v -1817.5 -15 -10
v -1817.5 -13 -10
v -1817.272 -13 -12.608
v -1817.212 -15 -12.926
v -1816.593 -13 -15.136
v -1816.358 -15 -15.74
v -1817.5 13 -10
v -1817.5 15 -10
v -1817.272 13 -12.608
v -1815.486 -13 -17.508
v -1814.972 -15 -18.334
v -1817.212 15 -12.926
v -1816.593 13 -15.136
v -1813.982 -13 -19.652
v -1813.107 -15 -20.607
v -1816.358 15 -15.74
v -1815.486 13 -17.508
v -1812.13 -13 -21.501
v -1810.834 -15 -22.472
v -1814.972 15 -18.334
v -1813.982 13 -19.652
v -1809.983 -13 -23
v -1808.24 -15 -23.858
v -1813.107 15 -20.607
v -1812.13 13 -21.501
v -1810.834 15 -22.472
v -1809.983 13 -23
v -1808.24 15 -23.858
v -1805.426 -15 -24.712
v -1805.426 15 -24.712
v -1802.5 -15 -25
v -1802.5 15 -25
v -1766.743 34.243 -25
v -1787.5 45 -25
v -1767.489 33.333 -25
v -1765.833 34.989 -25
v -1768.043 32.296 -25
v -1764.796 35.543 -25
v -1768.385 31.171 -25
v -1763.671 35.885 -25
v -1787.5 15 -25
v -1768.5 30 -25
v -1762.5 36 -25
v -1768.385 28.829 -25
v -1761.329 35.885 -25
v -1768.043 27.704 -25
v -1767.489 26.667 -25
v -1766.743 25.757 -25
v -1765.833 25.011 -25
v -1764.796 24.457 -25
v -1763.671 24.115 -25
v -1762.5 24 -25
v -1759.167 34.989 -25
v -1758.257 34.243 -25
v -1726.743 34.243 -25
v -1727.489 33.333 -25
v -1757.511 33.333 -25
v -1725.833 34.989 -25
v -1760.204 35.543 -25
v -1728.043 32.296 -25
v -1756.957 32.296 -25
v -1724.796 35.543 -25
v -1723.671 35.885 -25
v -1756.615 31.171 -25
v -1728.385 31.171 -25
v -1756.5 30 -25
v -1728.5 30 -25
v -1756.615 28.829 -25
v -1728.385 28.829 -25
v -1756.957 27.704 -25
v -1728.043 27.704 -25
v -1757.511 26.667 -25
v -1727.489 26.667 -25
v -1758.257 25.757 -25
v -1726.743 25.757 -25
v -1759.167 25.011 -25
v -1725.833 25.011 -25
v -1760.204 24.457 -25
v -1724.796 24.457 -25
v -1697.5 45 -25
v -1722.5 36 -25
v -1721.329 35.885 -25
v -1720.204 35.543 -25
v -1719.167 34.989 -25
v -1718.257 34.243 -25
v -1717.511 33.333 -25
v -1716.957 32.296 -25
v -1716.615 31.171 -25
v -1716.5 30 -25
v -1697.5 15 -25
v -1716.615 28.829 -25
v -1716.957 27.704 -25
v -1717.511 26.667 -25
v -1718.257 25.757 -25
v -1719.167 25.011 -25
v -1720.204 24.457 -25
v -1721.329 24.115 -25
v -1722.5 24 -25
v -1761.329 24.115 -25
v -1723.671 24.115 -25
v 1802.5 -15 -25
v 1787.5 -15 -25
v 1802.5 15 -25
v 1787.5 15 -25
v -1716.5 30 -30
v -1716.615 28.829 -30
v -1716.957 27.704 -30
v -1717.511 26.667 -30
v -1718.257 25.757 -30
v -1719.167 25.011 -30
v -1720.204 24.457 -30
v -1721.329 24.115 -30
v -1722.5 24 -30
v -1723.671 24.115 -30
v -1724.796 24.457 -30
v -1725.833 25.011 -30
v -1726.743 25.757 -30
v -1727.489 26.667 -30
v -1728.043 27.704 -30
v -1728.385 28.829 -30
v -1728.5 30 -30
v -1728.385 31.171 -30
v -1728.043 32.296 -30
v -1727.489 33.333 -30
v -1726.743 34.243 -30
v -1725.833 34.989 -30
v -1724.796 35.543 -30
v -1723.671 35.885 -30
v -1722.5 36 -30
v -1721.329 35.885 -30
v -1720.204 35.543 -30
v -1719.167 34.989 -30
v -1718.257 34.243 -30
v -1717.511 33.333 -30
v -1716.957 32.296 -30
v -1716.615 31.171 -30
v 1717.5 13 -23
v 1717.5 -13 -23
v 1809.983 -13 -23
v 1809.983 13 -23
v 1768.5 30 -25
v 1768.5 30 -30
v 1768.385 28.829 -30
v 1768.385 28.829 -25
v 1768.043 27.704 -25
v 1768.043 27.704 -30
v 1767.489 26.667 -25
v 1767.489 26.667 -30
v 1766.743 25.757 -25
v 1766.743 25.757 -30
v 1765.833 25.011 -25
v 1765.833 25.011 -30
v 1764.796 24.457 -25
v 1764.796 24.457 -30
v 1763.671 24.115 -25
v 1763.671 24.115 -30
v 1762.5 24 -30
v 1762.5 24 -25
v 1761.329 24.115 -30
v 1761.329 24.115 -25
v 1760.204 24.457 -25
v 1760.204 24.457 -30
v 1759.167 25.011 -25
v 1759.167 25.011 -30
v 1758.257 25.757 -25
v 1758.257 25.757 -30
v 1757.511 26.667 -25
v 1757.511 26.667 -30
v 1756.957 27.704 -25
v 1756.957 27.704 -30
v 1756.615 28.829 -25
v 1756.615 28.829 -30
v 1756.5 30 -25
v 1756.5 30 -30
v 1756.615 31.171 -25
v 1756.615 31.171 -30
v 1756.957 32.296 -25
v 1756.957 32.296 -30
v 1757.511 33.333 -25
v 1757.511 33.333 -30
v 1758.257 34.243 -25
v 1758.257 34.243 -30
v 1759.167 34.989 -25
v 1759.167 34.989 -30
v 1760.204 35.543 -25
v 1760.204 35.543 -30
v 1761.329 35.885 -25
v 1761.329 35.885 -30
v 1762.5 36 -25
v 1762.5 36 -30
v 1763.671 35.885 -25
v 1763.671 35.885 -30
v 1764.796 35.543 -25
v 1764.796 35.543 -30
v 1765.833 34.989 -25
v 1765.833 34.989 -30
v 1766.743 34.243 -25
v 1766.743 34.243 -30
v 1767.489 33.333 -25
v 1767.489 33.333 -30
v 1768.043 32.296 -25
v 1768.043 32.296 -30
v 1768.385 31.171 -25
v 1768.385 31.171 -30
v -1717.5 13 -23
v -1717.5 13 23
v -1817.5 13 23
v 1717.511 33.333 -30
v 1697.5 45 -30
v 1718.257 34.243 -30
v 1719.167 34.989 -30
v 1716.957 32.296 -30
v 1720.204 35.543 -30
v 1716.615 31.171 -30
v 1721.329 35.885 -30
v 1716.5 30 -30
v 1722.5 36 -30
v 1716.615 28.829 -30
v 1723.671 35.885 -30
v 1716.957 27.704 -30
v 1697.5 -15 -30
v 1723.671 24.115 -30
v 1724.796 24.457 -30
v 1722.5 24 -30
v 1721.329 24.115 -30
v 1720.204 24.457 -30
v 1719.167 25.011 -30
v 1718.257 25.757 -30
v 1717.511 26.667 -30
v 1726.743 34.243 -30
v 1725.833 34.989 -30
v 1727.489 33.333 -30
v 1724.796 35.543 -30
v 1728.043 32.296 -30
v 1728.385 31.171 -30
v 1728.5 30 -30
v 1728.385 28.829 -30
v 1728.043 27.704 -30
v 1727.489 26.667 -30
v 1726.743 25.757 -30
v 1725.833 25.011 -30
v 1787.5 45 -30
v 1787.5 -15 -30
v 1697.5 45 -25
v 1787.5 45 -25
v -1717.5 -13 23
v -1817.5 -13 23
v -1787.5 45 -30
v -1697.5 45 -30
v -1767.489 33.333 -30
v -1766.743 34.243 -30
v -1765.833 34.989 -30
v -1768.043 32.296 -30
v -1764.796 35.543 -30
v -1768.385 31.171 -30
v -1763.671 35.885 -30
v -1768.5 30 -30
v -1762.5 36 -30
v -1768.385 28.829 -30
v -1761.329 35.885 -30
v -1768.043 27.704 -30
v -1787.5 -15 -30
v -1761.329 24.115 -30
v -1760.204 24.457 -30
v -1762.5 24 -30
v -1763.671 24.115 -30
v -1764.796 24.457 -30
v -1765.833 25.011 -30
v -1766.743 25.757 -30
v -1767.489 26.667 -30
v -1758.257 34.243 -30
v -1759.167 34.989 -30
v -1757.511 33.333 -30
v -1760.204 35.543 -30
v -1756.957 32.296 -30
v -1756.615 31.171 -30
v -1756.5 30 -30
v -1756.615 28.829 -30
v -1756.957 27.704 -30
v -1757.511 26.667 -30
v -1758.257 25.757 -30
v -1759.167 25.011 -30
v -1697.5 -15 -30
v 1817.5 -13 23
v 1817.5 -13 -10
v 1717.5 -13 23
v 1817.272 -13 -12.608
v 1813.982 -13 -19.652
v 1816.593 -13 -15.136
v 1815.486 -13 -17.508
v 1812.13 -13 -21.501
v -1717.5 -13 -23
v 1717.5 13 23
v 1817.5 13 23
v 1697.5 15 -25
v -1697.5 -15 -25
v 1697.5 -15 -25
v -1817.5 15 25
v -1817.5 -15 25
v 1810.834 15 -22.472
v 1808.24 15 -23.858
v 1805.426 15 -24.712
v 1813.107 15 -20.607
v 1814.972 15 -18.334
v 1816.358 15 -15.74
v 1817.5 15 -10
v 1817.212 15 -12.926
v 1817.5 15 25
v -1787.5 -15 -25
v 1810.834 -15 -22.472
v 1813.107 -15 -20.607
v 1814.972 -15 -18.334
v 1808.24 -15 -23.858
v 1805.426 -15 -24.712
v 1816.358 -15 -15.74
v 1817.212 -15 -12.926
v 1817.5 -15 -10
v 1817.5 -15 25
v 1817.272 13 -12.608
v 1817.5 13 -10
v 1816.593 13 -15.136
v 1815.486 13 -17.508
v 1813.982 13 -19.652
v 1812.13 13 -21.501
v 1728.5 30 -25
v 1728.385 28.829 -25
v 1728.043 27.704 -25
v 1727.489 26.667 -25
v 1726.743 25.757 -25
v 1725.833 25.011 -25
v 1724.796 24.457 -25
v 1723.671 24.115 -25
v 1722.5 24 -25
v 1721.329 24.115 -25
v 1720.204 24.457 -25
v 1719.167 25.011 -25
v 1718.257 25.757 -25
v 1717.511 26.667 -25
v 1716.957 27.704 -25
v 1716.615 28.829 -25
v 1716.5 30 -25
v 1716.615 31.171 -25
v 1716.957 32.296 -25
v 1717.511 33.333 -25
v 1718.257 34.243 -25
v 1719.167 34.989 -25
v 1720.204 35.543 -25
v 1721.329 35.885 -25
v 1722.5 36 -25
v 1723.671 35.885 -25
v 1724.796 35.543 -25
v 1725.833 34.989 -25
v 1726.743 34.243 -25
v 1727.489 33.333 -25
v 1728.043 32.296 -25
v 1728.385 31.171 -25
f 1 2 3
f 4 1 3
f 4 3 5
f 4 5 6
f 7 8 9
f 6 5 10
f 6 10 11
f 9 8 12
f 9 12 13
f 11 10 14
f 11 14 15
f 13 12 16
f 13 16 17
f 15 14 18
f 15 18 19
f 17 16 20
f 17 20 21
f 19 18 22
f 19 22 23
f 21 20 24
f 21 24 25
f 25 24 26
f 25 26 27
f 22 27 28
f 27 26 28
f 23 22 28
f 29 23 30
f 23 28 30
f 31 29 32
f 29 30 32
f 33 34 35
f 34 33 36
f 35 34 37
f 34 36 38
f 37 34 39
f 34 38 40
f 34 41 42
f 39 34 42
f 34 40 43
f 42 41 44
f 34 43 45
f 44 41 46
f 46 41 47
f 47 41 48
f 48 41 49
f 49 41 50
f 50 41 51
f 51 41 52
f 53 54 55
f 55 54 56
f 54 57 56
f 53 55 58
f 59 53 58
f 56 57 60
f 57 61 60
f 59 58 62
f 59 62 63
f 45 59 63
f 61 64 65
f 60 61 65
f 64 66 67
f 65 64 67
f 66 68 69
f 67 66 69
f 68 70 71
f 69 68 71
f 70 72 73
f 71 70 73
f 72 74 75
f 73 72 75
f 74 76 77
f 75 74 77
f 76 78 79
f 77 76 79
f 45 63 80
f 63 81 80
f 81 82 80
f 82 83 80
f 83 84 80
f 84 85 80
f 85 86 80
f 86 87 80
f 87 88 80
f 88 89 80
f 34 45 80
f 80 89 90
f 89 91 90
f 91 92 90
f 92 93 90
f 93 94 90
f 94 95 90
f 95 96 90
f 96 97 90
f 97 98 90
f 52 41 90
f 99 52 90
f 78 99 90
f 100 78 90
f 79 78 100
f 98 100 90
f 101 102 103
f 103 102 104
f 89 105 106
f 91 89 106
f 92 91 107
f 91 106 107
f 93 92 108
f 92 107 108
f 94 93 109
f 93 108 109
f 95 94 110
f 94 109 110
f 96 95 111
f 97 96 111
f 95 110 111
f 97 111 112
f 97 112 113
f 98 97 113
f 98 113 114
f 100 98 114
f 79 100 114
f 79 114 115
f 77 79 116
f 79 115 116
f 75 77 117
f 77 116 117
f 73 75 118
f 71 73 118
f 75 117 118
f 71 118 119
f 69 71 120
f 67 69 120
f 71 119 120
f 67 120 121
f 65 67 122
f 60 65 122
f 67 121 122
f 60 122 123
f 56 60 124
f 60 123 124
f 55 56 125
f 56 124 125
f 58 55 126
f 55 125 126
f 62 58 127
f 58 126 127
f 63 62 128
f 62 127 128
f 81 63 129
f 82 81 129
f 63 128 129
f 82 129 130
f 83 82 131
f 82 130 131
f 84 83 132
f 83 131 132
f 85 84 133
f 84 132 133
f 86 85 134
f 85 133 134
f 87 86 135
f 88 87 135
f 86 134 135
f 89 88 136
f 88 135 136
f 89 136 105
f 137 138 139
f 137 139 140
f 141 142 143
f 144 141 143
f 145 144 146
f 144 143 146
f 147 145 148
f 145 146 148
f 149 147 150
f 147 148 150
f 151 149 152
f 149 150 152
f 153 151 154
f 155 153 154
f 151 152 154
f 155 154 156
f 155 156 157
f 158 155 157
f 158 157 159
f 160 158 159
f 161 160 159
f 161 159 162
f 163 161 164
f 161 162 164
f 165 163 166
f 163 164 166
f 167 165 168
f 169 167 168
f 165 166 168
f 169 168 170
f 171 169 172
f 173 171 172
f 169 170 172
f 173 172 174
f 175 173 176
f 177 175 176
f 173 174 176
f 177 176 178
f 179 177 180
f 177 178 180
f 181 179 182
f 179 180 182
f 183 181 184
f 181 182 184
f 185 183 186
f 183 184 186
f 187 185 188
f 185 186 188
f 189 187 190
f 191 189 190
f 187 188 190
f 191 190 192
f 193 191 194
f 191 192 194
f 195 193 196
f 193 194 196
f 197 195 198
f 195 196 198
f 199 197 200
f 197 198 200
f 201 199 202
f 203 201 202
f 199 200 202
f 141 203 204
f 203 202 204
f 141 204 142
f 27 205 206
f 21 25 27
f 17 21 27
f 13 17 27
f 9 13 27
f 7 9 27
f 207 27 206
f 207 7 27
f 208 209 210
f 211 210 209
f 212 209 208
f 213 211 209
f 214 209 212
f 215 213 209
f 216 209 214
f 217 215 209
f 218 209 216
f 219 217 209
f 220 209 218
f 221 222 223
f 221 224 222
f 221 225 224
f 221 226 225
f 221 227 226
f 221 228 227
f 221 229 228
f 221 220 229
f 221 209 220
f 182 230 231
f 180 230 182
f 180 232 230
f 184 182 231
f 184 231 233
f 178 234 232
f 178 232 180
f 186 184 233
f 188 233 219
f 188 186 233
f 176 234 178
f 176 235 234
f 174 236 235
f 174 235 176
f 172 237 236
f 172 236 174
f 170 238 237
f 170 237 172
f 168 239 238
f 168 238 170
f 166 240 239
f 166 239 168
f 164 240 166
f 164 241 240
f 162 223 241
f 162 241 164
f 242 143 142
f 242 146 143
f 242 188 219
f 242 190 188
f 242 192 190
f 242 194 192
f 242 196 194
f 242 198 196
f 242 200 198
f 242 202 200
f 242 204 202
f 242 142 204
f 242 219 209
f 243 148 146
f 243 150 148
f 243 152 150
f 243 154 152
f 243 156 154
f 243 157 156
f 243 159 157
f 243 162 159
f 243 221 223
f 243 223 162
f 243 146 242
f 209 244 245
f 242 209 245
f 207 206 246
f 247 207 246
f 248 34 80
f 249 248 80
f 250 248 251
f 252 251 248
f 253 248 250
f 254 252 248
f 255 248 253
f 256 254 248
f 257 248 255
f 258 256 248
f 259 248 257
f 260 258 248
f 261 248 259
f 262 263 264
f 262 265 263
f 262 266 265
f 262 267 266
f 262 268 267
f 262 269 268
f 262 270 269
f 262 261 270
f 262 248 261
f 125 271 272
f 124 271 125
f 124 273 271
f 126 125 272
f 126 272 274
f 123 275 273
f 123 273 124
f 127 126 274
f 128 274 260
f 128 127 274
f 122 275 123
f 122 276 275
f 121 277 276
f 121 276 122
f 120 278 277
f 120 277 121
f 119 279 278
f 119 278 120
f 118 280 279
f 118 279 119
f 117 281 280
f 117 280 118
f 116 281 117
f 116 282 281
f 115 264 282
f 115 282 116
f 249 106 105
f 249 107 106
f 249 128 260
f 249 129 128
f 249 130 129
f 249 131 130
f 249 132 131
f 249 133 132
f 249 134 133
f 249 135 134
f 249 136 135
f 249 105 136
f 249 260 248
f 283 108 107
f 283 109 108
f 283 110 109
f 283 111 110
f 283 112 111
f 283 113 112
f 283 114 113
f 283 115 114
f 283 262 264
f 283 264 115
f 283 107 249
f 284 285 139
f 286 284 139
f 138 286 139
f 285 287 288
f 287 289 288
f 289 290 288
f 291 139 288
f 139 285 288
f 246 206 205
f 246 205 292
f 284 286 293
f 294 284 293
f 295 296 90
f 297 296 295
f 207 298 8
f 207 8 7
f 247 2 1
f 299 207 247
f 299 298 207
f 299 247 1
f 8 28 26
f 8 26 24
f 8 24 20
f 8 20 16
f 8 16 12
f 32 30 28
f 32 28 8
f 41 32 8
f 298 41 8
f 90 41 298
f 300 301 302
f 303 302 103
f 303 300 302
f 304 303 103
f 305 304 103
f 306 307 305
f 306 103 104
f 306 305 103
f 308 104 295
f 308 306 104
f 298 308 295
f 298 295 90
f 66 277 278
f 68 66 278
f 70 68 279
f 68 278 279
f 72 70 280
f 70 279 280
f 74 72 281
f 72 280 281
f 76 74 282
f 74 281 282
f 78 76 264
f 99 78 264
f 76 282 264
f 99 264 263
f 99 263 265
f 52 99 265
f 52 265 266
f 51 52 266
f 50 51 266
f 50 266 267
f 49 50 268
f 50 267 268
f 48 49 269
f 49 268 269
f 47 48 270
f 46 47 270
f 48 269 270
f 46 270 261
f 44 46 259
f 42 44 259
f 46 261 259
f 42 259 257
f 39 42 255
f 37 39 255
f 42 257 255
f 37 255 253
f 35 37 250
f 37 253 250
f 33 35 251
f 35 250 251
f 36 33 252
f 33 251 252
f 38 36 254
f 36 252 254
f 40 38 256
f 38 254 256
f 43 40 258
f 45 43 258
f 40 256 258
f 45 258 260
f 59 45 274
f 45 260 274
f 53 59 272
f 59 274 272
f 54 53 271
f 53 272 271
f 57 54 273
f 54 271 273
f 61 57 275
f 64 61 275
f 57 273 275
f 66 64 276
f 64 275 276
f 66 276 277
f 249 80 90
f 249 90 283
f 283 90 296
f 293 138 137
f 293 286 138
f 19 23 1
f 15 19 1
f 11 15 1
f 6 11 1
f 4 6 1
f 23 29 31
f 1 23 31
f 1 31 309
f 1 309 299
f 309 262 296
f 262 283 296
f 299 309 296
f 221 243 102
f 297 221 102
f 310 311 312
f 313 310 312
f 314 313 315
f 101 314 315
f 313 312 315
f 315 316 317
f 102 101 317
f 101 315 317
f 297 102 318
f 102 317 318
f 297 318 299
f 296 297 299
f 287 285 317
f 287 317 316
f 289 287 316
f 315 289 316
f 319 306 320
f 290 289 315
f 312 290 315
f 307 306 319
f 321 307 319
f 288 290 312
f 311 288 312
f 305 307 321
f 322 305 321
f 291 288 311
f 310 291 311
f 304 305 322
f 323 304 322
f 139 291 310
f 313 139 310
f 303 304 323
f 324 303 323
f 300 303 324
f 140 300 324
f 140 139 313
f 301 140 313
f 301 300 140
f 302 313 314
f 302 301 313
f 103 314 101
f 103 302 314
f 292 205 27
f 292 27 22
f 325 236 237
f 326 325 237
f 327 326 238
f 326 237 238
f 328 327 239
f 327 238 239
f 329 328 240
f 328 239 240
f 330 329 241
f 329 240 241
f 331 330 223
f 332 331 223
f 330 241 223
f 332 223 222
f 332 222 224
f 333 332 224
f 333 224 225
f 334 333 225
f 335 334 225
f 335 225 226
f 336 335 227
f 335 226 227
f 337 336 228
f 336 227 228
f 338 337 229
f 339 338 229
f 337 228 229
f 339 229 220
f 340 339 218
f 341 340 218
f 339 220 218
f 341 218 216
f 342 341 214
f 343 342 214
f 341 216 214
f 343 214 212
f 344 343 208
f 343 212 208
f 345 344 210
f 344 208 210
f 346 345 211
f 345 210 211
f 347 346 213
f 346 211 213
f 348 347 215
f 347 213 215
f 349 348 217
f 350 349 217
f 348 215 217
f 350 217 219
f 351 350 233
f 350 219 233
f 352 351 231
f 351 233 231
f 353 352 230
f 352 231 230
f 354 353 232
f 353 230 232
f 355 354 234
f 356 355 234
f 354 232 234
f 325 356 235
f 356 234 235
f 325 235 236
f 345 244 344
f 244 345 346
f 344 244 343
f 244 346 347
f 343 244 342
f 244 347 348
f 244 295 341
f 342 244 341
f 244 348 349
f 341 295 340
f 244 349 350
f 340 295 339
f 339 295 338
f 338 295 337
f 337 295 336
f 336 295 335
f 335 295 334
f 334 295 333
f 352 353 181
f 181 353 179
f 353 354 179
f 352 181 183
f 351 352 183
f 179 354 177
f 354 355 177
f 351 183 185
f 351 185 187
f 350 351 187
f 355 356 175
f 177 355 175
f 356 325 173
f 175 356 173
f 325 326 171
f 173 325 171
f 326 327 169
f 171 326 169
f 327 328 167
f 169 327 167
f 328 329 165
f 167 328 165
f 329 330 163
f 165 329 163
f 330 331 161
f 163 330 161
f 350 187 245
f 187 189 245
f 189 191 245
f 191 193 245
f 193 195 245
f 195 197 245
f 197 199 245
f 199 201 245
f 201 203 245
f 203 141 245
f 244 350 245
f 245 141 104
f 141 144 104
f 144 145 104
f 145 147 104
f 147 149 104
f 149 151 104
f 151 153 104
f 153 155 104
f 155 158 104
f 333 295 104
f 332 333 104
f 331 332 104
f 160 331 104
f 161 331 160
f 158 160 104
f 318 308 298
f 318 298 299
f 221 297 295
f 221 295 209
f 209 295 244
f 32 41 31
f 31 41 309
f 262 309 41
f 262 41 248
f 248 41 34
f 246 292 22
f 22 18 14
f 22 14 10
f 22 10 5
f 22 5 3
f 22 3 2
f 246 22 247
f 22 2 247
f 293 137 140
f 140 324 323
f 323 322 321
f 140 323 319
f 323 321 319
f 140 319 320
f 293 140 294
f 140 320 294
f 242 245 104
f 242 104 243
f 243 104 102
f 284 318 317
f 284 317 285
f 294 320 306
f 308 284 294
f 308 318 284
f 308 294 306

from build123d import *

# Parameters (mm, degrees)
F0_W          = 3575
F0_H          = 50
F1_DEPTH      = 15
F1_DEPTH_BACK = 15
F2_W          = 90
F2_H          = 30
F3_DEPTH      = 5
F4_W          = 90
F4_H          = 30
F5_DEPTH      = 5
F6_R          = 6
F7_DEPTH      = 25
F8_R          = 6
F9_DEPTH      = 5
F10_R         = 6
F11_DEPTH     = 5
F12_W         = 30
F12_H         = 50
F13_DEPTH     = 30
F14_R         = 15
F15_W         = 26
F15_H         = 13
F15_H_2       = 33
F16_DEPTH     = 100
F17_W         = 30
F17_H         = 50
F18_DEPTH     = 30
F19_W         = 26
F19_H         = 46
F20_DEPTH     = 100
F21_T1_DEPTH  = 105


# Not quite as in the source:
# - a fillet or chamfer that OpenCascade refuses, or shapes differently, is made with other operations: its cross-section is extruded or revolved along the edge and cut away or added


with BuildPart() as f1:
    # F0 (on Front) → F1 (new body, two sides)
    with BuildSketch(Plane.XZ) as f1_sk:
        Rectangle(F0_W, F0_H)
    extrude(amount=F1_DEPTH)
    extrude(f1_sk.sketch, amount=-F1_DEPTH_BACK)

    # F2 (on face) → F3 (join)
    with BuildSketch(Plane(origin=(0, 0, -25), x_dir=(1, 0, 0), z_dir=(0, 0, -1))):
        with Locations((-1742.5, -30)):
            Rectangle(F2_W, F2_H)
        Polygon((-1697.5, 15), (-1787.5, 15), (-1787.5, 0), (-1787.5, -15), (-1697.5, -15), align=None)
    extrude(amount=F3_DEPTH)

    # F4 (on face) → F5 (join)
    with BuildSketch(Plane(origin=(0, 0, -25), x_dir=(1, 0, 0), z_dir=(0, 0, -1))):
        with Locations((1742.5, -30)):
            Rectangle(F4_W, F4_H)
        Polygon((1787.5, 0), (1787.5, 15), (1697.5, 15), (1697.5, -15), (1787.5, -15), align=None)
    extrude(amount=F5_DEPTH)

    # F6 (on face) → F7 (cut, through all)
    with BuildSketch(Plane.XY):
        with Locations((-935, 30)):
            Circle(F6_R)
        with Locations((-975, 30)):
            Circle(F6_R)
    extrude(amount=-F7_DEPTH, mode=Mode.SUBTRACT)

    # F8 (on face) → F9 (cut, through all)
    with BuildSketch(Plane(origin=(0, 0, -30), x_dir=(1, 0, 0), z_dir=(0, 0, -1))):
        with Locations((1762.5, -30)):
            Circle(F8_R)
        with Locations((1722.5, -30)):
            Circle(F8_R)
    extrude(amount=-F9_DEPTH, mode=Mode.SUBTRACT)

    # F10 (on face) → F11 (cut, through all)
    with BuildSketch(Plane(origin=(0, 0, -30), x_dir=(1, 0, 0), z_dir=(0, 0, -1))):
        with Locations((-1722.5, -30)):
            Circle(F10_R)
        with Locations((-1762.5, -30)):
            Circle(F10_R)
    extrude(amount=-F11_DEPTH, mode=Mode.SUBTRACT)

    # F12 (on face) → F13 (join)
    with BuildSketch(Plane.YZ.offset(1787.5)):
        Rectangle(F12_W, F12_H)
    extrude(amount=F13_DEPTH)

    # F14
    f14_edges = [f1.edges().sort_by_distance(p)[0] for p in [
        (1817.5, 0, -25),
    ]]
    fillet(f14_edges, radius=F14_R)

    # F15 (on face) → F16 (cut)
    with BuildSketch(Plane.YZ.offset(1817.5)):
        with Locations((0, -16.5)):
            Rectangle(F15_W, F15_H)
        with Locations((0, 6.5)):
            Rectangle(F15_W, F15_H_2)
    extrude(amount=-F16_DEPTH, mode=Mode.SUBTRACT)

    # F17 (on face) → F18 (join)
    with BuildSketch(Plane(origin=(-1787.5, 0, 0), x_dir=(0, -1, 0), z_dir=(-1, 0, 0))):
        Rectangle(F17_W, F17_H)
    extrude(amount=F18_DEPTH)

    # F19 (on face) → F20 (cut)
    with BuildSketch(Plane(origin=(-1817.5, 0, 0), x_dir=(0, -1, 0), z_dir=(-1, 0, 0))):
        Rectangle(F19_W, F19_H)
    extrude(amount=-F20_DEPTH, mode=Mode.SUBTRACT)

    # F21: fillet of radius 15 on 1 edges, made by hand

    # F21_s2 → F21_t1 (cut)
    with BuildSketch(Plane.XZ.offset(-52.5)):
        with BuildLine():
            ThreePointArc((-1817.5, -10), (-1813.1066017178, -20.6066017178), (-1802.5, -25))
            Line((-1802.5, -25), (-1817.5, -25))
            Line((-1817.5, -25), (-1817.5, -10))
        make_face()
    extrude(amount=F21_T1_DEPTH, mode=Mode.SUBTRACT)


solid = f1.part
